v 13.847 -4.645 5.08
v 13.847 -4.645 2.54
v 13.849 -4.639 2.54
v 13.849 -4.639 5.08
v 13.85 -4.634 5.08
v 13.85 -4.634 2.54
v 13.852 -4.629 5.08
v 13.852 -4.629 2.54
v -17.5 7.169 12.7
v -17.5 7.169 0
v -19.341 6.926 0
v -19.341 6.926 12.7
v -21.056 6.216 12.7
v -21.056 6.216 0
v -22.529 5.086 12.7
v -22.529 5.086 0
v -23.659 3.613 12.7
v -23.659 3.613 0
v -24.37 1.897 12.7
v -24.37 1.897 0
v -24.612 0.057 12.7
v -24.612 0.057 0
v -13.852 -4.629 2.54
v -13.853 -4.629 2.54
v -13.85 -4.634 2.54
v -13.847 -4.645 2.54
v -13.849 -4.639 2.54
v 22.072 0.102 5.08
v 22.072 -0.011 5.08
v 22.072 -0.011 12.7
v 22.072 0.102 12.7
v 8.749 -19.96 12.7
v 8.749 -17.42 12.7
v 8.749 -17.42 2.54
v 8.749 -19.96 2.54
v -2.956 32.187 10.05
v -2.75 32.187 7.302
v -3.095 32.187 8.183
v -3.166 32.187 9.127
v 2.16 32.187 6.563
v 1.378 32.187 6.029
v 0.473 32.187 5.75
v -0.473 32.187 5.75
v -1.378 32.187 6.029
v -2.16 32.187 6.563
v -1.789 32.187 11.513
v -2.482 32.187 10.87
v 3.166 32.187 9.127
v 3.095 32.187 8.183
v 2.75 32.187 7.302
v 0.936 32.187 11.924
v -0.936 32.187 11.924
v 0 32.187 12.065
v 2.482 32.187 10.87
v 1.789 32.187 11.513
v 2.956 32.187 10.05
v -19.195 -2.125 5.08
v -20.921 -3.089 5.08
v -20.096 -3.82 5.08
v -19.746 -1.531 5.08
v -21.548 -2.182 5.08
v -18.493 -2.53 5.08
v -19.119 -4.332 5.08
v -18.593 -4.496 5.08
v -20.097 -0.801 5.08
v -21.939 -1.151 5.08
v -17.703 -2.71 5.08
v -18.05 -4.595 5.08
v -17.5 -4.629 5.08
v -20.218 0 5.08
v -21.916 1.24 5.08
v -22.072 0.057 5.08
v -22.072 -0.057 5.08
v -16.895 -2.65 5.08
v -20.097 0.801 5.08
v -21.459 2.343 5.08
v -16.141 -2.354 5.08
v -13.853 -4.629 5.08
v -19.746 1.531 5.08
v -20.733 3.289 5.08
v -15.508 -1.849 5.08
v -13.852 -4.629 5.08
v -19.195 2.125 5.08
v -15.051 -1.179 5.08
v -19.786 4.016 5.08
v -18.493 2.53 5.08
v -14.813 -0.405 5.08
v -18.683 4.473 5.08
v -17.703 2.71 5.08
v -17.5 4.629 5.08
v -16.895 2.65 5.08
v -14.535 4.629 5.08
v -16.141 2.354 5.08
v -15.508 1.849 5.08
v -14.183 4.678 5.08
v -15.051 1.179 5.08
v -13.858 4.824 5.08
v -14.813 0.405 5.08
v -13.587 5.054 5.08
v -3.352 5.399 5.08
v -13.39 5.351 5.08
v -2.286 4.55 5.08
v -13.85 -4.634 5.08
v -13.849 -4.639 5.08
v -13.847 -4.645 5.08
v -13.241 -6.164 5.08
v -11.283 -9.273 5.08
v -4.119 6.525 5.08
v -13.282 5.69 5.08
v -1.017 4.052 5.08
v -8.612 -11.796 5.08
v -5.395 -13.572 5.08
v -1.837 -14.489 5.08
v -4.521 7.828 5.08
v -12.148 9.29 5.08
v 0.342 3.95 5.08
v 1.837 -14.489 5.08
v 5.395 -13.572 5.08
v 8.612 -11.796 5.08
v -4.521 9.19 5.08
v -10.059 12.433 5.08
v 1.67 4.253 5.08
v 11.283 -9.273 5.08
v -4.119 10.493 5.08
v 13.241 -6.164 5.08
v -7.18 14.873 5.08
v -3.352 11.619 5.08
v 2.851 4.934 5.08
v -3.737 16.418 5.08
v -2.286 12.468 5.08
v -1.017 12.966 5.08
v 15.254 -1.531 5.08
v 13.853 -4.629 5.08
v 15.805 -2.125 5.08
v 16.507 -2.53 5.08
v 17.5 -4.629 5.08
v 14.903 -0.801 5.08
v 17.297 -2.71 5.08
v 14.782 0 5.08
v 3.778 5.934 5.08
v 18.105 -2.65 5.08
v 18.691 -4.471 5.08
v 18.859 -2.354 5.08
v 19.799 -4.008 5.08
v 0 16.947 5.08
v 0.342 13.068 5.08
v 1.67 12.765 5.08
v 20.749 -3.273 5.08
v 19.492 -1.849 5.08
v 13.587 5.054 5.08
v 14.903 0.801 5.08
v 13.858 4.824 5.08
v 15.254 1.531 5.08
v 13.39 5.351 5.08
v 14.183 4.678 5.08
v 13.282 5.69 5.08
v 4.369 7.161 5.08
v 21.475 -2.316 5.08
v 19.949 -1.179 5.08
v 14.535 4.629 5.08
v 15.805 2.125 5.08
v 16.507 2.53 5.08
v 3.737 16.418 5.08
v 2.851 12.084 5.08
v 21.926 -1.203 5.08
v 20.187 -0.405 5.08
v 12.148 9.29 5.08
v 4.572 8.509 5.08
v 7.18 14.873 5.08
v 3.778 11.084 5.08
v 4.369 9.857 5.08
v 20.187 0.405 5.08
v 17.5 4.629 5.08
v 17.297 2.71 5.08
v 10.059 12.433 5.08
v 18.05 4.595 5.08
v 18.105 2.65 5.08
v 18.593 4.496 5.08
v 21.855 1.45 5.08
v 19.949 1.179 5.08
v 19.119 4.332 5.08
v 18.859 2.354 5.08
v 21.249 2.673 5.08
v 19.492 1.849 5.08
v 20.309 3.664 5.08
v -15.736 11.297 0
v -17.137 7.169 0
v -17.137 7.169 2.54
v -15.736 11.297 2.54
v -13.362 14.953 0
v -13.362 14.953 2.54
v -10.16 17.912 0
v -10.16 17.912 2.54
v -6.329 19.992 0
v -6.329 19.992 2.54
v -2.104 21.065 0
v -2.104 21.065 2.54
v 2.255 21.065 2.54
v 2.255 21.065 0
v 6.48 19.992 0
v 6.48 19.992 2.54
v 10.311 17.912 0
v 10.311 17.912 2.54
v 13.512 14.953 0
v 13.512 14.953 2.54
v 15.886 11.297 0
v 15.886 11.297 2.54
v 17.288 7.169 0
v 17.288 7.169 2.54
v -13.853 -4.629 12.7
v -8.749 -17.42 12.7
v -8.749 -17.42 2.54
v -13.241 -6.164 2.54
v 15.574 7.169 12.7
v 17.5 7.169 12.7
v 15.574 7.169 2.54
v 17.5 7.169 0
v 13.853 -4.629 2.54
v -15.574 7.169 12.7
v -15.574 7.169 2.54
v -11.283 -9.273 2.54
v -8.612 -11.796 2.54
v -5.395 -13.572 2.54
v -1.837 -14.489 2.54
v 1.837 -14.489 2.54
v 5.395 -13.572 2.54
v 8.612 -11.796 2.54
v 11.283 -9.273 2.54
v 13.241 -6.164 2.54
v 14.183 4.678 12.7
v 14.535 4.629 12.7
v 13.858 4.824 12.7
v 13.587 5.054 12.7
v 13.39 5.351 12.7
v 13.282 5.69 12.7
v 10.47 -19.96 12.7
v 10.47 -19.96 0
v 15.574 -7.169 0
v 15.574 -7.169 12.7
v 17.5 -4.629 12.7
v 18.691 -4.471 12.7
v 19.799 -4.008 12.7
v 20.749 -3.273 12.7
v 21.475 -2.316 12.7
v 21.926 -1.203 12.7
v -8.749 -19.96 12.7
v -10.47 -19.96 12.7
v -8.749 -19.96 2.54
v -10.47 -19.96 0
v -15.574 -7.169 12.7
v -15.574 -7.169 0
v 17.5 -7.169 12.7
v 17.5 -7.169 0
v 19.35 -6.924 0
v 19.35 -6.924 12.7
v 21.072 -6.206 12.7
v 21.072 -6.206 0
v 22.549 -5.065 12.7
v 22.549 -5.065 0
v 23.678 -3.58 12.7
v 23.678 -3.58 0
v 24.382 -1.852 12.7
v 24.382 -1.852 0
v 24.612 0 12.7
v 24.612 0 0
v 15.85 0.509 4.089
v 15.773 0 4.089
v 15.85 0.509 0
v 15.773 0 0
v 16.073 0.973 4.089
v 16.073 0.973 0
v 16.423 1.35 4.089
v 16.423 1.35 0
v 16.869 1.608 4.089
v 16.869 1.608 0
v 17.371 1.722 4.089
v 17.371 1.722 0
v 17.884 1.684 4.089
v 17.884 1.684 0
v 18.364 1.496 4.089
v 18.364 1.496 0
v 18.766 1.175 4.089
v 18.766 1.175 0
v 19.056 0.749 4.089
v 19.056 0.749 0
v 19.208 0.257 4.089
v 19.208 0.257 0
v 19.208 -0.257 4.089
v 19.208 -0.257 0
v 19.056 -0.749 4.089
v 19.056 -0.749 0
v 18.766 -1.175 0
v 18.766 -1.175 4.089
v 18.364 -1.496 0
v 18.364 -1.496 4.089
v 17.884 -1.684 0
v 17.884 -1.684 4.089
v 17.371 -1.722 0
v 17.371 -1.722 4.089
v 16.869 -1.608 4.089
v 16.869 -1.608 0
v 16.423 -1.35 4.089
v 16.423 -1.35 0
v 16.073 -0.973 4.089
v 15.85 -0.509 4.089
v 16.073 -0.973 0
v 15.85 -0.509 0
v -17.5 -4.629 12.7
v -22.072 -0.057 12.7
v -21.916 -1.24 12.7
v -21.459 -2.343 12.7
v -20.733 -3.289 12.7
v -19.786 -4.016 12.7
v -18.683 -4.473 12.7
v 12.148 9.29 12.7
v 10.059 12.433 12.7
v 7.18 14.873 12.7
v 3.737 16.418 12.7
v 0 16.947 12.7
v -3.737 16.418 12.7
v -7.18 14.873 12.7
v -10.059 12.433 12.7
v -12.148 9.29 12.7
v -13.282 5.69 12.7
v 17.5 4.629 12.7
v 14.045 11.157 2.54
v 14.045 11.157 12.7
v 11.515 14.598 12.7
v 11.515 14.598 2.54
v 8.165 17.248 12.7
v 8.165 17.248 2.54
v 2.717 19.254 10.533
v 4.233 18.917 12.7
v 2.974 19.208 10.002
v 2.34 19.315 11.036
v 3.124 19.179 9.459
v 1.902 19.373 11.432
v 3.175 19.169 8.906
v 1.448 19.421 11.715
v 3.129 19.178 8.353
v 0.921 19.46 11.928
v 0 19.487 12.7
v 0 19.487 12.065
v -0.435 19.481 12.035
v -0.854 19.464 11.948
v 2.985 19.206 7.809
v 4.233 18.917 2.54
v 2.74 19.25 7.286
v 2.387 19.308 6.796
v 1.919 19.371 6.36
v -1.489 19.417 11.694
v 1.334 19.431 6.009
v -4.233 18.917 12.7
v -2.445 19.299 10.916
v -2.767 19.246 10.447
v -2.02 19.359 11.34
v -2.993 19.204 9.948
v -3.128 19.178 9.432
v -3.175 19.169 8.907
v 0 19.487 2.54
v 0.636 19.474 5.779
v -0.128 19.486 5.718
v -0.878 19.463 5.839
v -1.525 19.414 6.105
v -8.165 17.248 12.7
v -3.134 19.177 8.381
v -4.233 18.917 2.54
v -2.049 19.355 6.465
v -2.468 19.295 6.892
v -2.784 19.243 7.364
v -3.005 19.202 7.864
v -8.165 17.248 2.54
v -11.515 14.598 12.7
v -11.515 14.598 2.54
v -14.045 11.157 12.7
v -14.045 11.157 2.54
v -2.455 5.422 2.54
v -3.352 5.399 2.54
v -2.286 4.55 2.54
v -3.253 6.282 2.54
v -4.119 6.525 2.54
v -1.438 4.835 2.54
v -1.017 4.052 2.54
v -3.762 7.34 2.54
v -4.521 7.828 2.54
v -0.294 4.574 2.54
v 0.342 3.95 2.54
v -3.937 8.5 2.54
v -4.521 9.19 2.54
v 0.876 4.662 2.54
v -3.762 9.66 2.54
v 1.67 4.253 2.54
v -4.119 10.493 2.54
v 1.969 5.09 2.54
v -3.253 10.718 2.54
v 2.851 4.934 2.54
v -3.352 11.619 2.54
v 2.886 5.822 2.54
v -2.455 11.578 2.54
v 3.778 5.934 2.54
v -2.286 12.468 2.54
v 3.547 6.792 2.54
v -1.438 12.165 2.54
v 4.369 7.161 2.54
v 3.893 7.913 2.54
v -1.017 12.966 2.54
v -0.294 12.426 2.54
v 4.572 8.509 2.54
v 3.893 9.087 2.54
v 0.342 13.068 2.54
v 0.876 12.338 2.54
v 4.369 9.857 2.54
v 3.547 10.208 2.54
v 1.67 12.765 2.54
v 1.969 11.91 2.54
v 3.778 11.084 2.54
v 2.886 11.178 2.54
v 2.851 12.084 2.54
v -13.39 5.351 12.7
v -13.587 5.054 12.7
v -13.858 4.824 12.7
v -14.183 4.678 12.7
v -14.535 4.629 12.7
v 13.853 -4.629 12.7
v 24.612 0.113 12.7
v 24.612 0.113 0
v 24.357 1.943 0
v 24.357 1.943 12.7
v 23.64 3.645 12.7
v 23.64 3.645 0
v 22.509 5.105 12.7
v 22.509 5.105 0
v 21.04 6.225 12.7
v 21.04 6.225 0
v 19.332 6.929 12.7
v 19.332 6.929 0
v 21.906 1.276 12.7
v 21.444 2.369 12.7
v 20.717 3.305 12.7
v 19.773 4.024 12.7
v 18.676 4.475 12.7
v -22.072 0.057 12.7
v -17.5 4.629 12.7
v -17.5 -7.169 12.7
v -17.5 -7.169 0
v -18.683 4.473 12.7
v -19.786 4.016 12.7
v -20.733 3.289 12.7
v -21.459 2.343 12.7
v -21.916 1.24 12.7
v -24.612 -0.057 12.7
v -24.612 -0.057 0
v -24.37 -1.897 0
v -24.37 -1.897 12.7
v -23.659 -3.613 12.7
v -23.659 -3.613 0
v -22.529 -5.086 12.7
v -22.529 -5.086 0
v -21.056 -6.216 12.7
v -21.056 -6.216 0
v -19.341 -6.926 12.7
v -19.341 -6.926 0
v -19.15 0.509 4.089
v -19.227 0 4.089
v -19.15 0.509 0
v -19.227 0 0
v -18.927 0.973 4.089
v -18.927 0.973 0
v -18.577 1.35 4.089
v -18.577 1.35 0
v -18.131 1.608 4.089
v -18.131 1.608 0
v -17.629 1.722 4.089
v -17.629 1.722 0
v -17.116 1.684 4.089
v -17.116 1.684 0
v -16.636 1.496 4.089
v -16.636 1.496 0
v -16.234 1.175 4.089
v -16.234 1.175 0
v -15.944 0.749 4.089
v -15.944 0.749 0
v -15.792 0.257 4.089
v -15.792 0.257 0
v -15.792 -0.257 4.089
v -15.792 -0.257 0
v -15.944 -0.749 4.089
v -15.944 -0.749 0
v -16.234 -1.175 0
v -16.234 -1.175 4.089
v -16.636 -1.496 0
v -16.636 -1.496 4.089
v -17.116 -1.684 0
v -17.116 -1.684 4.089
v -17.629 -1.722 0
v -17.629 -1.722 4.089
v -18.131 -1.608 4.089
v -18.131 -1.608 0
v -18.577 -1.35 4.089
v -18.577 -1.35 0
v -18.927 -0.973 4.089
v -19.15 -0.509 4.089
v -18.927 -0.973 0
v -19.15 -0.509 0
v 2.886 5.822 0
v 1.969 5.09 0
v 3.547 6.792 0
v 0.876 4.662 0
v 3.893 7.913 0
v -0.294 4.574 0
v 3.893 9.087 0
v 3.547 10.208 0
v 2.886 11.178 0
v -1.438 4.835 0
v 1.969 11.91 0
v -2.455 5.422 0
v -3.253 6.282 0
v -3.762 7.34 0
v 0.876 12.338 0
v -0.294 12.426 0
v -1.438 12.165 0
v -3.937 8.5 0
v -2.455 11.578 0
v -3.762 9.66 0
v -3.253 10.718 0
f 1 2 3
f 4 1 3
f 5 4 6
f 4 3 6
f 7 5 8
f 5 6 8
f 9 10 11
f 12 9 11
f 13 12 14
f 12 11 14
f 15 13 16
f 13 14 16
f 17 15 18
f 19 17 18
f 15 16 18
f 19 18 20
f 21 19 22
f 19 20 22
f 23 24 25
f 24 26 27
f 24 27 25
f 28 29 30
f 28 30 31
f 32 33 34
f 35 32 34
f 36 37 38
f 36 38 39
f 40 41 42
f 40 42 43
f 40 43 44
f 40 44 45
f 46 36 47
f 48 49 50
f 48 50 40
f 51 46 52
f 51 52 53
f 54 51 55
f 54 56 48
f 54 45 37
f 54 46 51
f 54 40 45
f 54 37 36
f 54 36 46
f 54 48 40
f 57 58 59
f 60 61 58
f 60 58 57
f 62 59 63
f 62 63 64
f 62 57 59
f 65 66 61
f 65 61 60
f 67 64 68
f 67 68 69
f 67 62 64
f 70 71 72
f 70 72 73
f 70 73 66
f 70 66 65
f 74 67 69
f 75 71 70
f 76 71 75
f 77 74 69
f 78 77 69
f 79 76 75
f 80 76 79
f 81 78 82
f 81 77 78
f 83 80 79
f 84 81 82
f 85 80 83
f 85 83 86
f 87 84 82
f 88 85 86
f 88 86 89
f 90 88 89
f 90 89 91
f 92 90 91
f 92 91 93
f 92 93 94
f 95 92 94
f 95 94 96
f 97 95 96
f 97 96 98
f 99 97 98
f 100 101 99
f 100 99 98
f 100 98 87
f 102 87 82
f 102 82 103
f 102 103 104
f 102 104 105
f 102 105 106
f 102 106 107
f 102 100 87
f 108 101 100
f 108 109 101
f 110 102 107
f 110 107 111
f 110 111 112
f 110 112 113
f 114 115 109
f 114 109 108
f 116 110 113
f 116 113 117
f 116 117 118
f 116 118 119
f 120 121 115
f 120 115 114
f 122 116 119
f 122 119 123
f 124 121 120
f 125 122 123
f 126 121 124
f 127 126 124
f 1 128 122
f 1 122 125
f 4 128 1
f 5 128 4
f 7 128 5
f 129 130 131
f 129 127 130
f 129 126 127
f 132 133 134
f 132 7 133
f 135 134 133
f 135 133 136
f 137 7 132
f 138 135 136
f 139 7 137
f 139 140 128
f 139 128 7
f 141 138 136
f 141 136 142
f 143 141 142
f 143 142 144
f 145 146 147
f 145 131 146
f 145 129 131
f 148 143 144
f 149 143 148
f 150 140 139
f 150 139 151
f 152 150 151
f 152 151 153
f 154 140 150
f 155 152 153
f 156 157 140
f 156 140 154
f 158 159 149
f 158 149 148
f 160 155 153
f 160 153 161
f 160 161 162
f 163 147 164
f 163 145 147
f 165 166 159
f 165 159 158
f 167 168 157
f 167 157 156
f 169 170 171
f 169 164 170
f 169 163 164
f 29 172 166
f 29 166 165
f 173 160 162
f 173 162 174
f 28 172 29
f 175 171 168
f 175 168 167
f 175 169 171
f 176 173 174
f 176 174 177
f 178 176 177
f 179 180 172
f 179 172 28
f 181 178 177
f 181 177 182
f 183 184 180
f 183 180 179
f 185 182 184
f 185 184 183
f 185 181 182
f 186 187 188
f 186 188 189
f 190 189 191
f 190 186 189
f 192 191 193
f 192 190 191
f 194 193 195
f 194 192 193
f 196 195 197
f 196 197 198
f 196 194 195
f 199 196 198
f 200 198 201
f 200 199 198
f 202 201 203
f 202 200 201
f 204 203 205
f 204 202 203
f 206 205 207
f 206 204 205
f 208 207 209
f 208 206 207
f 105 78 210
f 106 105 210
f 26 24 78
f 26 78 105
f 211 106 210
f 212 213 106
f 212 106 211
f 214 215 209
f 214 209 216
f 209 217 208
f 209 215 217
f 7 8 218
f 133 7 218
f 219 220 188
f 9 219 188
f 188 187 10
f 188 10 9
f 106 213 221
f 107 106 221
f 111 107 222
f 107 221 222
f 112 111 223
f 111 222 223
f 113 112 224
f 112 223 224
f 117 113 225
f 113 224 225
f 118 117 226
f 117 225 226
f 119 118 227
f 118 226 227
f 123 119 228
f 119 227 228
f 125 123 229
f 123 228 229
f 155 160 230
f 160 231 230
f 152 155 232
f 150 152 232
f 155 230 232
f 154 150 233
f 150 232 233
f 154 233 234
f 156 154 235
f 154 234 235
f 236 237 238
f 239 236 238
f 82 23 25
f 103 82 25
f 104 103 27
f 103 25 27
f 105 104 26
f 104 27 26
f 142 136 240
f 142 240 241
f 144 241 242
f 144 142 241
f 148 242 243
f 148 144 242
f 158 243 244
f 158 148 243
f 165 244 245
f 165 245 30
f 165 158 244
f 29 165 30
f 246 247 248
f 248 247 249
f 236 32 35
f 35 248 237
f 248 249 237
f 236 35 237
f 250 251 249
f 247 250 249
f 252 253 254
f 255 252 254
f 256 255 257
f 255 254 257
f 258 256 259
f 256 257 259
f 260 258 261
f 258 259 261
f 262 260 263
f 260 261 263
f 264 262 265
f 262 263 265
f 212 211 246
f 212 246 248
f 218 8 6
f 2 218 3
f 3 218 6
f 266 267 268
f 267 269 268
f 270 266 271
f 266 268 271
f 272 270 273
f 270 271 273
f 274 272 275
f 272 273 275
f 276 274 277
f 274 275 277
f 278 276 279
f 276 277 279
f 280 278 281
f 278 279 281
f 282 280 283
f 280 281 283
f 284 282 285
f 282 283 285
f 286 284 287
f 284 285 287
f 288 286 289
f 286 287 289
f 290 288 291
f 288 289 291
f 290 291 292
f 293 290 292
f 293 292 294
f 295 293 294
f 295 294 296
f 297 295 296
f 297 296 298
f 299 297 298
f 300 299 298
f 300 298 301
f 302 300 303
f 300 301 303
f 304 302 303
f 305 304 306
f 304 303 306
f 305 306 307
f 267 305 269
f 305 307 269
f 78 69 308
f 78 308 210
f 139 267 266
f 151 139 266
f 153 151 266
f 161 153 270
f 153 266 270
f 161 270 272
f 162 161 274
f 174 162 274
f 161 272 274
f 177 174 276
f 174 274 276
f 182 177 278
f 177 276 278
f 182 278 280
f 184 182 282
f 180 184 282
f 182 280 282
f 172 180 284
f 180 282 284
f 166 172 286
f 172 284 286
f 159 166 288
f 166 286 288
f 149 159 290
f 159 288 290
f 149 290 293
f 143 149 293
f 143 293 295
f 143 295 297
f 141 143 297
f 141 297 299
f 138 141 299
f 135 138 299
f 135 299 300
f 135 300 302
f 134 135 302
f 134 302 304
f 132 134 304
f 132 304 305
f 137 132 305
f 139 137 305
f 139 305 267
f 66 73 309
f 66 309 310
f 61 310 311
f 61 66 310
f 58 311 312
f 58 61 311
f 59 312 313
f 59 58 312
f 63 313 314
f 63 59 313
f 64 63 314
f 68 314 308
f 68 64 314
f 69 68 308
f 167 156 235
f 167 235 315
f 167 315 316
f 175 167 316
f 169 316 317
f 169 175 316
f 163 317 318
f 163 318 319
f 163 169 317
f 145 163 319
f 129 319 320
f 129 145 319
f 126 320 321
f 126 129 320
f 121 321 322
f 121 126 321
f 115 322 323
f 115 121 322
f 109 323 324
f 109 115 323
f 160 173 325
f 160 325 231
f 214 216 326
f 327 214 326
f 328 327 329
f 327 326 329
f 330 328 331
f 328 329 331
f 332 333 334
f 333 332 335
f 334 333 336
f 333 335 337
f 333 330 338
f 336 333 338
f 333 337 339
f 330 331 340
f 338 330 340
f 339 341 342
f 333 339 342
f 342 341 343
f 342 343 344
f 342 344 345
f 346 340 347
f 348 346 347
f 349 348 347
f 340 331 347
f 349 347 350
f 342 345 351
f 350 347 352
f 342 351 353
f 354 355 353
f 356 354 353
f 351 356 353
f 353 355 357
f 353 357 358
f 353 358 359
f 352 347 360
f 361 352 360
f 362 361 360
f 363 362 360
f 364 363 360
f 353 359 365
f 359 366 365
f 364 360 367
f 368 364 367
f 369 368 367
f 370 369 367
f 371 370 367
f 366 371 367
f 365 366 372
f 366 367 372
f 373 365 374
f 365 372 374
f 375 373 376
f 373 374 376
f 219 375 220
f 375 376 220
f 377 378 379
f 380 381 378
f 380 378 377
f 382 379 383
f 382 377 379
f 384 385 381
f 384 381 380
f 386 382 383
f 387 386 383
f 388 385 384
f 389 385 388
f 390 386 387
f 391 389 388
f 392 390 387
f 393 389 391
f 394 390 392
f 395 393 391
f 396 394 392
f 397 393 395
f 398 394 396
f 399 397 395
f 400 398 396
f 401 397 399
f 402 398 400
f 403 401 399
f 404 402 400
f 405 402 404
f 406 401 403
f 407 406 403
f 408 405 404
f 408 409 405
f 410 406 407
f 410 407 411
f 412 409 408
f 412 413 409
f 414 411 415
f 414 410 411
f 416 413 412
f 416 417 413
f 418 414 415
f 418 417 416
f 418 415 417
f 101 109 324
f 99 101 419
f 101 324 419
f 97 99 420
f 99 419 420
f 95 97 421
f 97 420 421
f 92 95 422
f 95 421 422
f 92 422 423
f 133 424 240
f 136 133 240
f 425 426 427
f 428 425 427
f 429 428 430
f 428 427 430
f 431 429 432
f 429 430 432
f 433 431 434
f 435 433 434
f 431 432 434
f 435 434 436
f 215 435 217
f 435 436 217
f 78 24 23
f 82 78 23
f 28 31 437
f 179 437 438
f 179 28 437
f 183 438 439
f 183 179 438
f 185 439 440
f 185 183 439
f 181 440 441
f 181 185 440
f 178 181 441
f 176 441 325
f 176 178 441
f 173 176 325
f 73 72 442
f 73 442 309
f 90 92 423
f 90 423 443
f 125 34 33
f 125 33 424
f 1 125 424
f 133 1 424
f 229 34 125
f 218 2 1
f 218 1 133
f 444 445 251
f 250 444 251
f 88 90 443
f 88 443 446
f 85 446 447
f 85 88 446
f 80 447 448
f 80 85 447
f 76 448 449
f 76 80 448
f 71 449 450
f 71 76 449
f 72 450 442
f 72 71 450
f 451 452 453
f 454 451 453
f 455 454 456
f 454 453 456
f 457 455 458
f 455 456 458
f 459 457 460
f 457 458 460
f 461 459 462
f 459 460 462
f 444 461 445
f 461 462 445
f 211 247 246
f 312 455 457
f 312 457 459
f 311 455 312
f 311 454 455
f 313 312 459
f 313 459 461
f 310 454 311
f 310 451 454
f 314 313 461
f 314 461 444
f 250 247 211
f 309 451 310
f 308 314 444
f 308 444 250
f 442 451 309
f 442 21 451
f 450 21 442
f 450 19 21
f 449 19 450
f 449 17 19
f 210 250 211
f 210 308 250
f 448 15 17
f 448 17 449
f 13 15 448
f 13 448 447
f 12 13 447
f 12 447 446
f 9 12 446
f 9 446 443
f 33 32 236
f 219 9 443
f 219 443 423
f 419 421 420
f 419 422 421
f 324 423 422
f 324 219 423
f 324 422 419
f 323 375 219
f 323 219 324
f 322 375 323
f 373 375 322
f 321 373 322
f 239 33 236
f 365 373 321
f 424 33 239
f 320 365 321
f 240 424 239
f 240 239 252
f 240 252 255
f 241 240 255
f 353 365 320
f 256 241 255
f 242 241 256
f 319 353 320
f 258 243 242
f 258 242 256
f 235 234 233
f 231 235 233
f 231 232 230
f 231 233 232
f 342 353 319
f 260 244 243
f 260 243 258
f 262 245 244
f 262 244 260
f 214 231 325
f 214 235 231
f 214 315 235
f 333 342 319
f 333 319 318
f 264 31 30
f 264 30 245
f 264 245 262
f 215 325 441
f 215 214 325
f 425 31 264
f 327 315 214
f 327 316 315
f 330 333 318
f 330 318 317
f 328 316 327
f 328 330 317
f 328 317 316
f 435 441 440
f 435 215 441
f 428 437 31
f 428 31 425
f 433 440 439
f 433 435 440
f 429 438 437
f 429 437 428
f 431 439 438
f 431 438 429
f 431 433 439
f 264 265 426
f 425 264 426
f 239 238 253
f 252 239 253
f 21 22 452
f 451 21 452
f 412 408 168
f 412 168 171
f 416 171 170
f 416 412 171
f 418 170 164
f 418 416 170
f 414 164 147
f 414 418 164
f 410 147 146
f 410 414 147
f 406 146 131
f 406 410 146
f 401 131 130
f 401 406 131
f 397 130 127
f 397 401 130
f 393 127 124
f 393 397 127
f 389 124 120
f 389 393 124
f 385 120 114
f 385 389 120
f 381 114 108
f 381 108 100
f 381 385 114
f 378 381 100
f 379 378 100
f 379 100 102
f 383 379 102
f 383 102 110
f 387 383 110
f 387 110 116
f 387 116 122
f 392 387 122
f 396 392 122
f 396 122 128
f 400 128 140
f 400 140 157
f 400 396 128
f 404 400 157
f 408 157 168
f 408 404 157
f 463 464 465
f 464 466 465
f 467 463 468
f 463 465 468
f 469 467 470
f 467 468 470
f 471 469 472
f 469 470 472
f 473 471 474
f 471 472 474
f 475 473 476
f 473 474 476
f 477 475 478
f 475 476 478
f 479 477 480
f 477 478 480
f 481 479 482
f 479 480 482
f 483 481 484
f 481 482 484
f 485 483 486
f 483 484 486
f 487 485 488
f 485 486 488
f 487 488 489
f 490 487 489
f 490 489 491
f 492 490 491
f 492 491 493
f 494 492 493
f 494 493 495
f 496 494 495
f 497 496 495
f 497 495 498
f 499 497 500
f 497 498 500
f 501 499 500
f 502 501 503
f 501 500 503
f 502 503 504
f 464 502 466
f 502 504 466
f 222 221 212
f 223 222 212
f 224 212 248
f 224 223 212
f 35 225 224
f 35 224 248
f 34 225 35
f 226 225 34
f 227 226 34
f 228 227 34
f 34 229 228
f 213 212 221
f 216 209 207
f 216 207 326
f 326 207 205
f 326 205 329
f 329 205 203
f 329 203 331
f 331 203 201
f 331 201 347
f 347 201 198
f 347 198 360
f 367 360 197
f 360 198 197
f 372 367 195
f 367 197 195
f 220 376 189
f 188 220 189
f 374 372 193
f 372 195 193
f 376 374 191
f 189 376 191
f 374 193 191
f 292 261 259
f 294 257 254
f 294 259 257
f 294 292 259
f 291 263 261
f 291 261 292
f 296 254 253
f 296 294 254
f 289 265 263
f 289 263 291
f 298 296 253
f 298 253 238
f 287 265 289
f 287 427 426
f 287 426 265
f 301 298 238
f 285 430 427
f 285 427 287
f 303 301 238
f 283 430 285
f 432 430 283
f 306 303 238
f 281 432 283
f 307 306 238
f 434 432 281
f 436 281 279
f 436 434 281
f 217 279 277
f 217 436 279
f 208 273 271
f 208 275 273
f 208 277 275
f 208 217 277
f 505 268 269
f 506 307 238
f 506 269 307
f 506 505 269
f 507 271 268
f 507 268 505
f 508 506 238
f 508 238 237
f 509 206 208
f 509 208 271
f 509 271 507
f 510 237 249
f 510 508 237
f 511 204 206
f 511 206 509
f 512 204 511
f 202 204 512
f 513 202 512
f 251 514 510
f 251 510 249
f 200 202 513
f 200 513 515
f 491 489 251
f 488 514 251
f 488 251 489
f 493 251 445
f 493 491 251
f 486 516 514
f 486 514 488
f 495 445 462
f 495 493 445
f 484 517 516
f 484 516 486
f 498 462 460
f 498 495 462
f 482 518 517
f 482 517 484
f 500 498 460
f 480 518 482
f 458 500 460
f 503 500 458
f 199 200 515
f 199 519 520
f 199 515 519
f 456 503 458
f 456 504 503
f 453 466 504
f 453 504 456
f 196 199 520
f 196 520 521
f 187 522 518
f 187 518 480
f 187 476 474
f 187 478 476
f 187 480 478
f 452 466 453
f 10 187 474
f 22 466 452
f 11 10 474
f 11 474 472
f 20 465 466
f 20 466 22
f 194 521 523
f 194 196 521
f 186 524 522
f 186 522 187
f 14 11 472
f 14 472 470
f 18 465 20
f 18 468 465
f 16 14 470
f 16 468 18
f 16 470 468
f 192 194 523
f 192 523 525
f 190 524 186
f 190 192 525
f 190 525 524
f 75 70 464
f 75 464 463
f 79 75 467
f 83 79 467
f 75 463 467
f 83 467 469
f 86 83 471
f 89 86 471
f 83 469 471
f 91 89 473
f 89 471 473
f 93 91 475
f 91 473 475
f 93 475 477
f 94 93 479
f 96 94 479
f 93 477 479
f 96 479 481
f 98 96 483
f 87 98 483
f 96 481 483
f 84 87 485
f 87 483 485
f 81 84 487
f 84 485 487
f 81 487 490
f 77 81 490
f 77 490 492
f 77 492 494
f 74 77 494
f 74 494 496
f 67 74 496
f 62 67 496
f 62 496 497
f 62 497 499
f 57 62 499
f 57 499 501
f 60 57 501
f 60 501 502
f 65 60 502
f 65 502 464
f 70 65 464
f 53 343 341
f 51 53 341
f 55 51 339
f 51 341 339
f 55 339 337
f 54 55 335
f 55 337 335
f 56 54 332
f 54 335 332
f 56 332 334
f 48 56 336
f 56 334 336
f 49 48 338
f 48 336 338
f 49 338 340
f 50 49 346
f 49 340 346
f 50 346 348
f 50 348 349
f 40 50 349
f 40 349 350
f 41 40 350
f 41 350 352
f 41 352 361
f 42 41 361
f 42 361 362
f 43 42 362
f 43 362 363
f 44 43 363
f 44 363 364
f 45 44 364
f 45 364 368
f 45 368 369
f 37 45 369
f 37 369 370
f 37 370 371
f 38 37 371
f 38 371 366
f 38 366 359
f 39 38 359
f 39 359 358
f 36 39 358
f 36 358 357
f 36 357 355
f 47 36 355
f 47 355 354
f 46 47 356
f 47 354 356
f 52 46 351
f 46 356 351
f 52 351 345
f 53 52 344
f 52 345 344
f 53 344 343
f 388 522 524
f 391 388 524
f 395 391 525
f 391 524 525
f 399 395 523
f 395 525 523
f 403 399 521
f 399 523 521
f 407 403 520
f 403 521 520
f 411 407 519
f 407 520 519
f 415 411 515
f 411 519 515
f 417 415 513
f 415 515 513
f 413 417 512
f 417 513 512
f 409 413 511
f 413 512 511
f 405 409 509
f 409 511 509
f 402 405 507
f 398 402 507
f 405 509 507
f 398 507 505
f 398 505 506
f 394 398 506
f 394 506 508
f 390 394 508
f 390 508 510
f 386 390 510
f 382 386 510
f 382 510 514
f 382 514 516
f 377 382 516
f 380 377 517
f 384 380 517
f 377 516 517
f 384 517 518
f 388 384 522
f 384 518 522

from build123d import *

# Parameters (mm, degrees)
BOSS_EXTRUDE1_DEPTH             = 12.7
SHELL1_START                    = 2.54
SHELL1_DEPTH                    = 10.16
BOSS_EXTRUDE7_DEPTH             = 2.54
SKETCH7_W                       = 17.498012995
SKETCH7_H                       = 10.16
CUT_EXTRUDE5_DEPTH              = 48.524856948
SKETCH13_R                      = 4.572
BOSS_EXTRUDE3_DEPTH             = 2.54
CUT_EXTRUDE7_DEPTH              = 34.365857316
CUT_EXTRUDE7_DEPTH_BACK         = 34.365857316
SKETCH14_R                      = 2.667
F_8_32_TAPPED_HOLE1_D           = 3.4544
F_8_32_TAPPED_HOLE1_CSINK_D     = 5.4356
F_8_32_TAPPED_HOLE1_CSINK_ANGLE = 90
BOSS_EXTRUDE4_DEPTH             = 12.7
BOSS_EXTRUDE4_DEPTH_BACK        = 1.27
SKETCH18_R                      = 3.175
SKETCH19_R                      = 3.937
CUT_EXTRUDE8_DEPTH              = 2.54
FILLET1_R                       = 1.27


# Read off the part's stored shape, not the designer's step: Shell1
with BuildPart() as part:
    # Sketch1 → Boss-Extrude1 (new body)
    with BuildSketch(Plane.XY):
        with BuildLine():
            Line((17.500007037, 7.168559726), (15.574433037, 7.168559726))
            ThreePointArc((15.574433037, 7.168559726), (0, 19.486736174), (-15.574433037, 7.168559726))
            Line((-15.574433037, 7.168559726), (-17.500007037, 7.168559726))
            ThreePointArc((-17.500007037, 7.168559726), (-22.528950465, 5.085503154), (-24.612007037, 0.056559726))
            Line((-24.612007037, 0.056559726), (-24.612007037, -0.056559726))
            ThreePointArc((-24.612007037, -0.056559726), (-22.528950465, -5.085503154), (-17.500007037, -7.168559726))
            Line((-17.500007037, -7.168559726), (-15.574433037, -7.168559726))
            Line((-15.574433037, -7.168559726), (-10.470235042, -19.960271007))
            Line((-10.470235042, -19.960271007), (10.470222973, -19.960271007))
            Line((10.470222973, -19.960271007), (15.574433037, -7.168559726))
            Line((15.574433037, -7.168559726), (17.500007037, -7.168559726))
            ThreePointArc((17.500007037, -7.168559726), (22.548907748, -5.065466355), (24.611782132, 0))
            Line((24.611782132, 0), (24.611782132, 0.113119452))
            ThreePointArc((24.611782132, 0.113119452), (22.508913666, 5.105460437), (17.500007037, 7.168559726))
        make_face()
    extrude(amount=BOSS_EXTRUDE1_DEPTH)

    # Shell1 outline → Shell1 (cut)
    with BuildSketch(Plane.XY.offset(SHELL1_START)):
        with BuildLine():
            ThreePointArc((13.415909513, 4.628559726), (0, 16.946736174), (-13.415909513, 4.628559726))
            Line((-13.415909513, 4.628559726), (-17.500007037, 4.628559726))
            ThreePointArc((-17.500007037, 4.628559726), (-20.732899241, 3.28945193), (-22.072007037, 0.056559726))
            Line((-22.072007037, 0.056559726), (-22.072007037, -0.056559726))
            ThreePointArc((-22.072007037, -0.056559726), (-20.732899241, -3.28945193), (-17.500007037, -4.628559726))
            Line((-17.500007037, -4.628559726), (-13.853209773, -4.628559726))
            Line((-13.853209773, -4.628559726), (-8.749011778, -17.420271007))
            Line((-8.749011778, -17.420271007), (8.749001217, -17.420271007))
            Line((8.749001217, -17.420271007), (13.853211281, -4.628559726))
            Line((13.853211281, -4.628559726), (17.500007037, -4.628559726))
            ThreePointArc((17.500007037, -4.628559726), (20.748892784, -3.273378869), (22.071782132, -0.011211257))
            Line((22.071782132, -0.011211257), (22.071782132, 0.101908195))
            ThreePointArc((22.071782132, 0.101908195), (20.71682618, 3.305445473), (17.500007037, 4.628559726))
            Line((17.500007037, 4.628559726), (13.415909513, 4.628559726))
        make_face()
    extrude(amount=SHELL1_DEPTH, mode=Mode.SUBTRACT)

    # Sketch22 → Boss-Extrude7 (add)
    with BuildSketch(Plane(origin=(0, 0, 0), x_dir=(-1, 0, 0), z_dir=(0, 0, -1))):
        with BuildLine():
            Line((-17.28751812, 7.168559726), (17.136892248, 7.168559726))
            ThreePointArc((17.136892248, 7.168559726), (-0.075312936, 21.200593012), (-17.28751812, 7.168559726))
        make_face()
    extrude(amount=-BOSS_EXTRUDE7_DEPTH)

    # Sketch7 → Cut-Extrude5 (cut, through all)
    with BuildSketch(Plane(origin=(0, -17.420271007, 0), x_dir=(1, 0, 0), z_dir=(0, 1, 0))):
        with Locations((-5.28e-06, -7.62)):
            Rectangle(SKETCH7_W, SKETCH7_H)
    extrude(amount=-CUT_EXTRUDE5_DEPTH, mode=Mode.SUBTRACT)

    # Sketch13 → Boss-Extrude3 (add)
    with BuildSketch(Plane.XY.offset(2.54)):
        with BuildLine():
            Line((-17.500007037, -4.628559726), (-13.852164447, -4.628559726))
            ThreePointArc((-13.852164447, -4.628559726), (0, -14.605), (13.852164447, -4.628559726))
            Line((13.852164447, -4.628559726), (16.51, -4.628559726))
            ThreePointArc((16.51, -4.628559726), (21.991424378, -1.364408419), (19.119271672, 4.332207752))
            ThreePointArc((19.119271672, 4.332207752), (18.323086992, 4.553861516), (17.500007037, 4.628559726))
            Line((17.500007037, 4.628559726), (13.415909513, 4.628559726))
            ThreePointArc((13.415909513, 4.628559726), (0, 16.946736174), (-13.415909513, 4.628559726))
            Line((-13.415909513, 4.628559726), (-16.51, 4.628559726))
            ThreePointArc((-16.51, 4.628559726), (-21.991424378, 1.364408419), (-19.119271672, -4.332207752))
            ThreePointArc((-19.119271672, -4.332207752), (-18.323086992, -4.553861516), (-17.500007037, -4.628559726))
        make_face()
        with Locations((0, 8.509)):
            Circle(SKETCH13_R, mode=Mode.SUBTRACT)
    extrude(amount=BOSS_EXTRUDE3_DEPTH)

    # Sketch14 → Cut-Extrude7 (cut, two sides: drawn at the far end of the back side and taken through both)
    with BuildSketch(Plane.XY.offset(5.08).offset(-CUT_EXTRUDE7_DEPTH_BACK)):
        with Locations((0, 8.50001094)):
            Circle(SKETCH14_R)
    extrude(amount=CUT_EXTRUDE7_DEPTH + CUT_EXTRUDE7_DEPTH_BACK, mode=Mode.SUBTRACT)

    # #8-32 Tapped Hole1 (through all)
    with Locations(Plane.XY.offset(5.08)):
        with Locations((-17.500007037, 0), (17.500007037, 0)):
            CounterSinkHole(F_8_32_TAPPED_HOLE1_D / 2, F_8_32_TAPPED_HOLE1_CSINK_D / 2, counter_sink_angle=F_8_32_TAPPED_HOLE1_CSINK_ANGLE)

    # Sketch18 → Boss-Extrude4 (add, two sides: drawn at the far end of the back side and taken through both)
    with BuildSketch(Plane(origin=(0, 19.486736174, 0), x_dir=(1, 0, 0), z_dir=(0, 1, 0)).offset(-BOSS_EXTRUDE4_DEPTH_BACK)):
        with Locations(Location((0, -8.89, 0), (0, 0, 270))):
            Circle(SKETCH18_R)
    extrude(amount=BOSS_EXTRUDE4_DEPTH + BOSS_EXTRUDE4_DEPTH_BACK)

    # Sketch19 → Cut-Extrude8 (cut)
    with BuildSketch(Plane(origin=(0, 0, 0), x_dir=(-1, 0, 0), z_dir=(0, 0, -1))):
        with Locations((0, 8.50001094)):
            Circle(SKETCH19_R)
    extrude(amount=-CUT_EXTRUDE8_DEPTH, mode=Mode.SUBTRACT)

    # Fillet1
    fillet1_edges = [part.edges().sort_by_distance(p)[0] for p in [
        (13.415909513, 4.628559726, 8.89),
        (-13.415909513, 4.628559726, 8.89),
    ]]
    fillet(fillet1_edges, radius=FILLET1_R)


solid = part.part
